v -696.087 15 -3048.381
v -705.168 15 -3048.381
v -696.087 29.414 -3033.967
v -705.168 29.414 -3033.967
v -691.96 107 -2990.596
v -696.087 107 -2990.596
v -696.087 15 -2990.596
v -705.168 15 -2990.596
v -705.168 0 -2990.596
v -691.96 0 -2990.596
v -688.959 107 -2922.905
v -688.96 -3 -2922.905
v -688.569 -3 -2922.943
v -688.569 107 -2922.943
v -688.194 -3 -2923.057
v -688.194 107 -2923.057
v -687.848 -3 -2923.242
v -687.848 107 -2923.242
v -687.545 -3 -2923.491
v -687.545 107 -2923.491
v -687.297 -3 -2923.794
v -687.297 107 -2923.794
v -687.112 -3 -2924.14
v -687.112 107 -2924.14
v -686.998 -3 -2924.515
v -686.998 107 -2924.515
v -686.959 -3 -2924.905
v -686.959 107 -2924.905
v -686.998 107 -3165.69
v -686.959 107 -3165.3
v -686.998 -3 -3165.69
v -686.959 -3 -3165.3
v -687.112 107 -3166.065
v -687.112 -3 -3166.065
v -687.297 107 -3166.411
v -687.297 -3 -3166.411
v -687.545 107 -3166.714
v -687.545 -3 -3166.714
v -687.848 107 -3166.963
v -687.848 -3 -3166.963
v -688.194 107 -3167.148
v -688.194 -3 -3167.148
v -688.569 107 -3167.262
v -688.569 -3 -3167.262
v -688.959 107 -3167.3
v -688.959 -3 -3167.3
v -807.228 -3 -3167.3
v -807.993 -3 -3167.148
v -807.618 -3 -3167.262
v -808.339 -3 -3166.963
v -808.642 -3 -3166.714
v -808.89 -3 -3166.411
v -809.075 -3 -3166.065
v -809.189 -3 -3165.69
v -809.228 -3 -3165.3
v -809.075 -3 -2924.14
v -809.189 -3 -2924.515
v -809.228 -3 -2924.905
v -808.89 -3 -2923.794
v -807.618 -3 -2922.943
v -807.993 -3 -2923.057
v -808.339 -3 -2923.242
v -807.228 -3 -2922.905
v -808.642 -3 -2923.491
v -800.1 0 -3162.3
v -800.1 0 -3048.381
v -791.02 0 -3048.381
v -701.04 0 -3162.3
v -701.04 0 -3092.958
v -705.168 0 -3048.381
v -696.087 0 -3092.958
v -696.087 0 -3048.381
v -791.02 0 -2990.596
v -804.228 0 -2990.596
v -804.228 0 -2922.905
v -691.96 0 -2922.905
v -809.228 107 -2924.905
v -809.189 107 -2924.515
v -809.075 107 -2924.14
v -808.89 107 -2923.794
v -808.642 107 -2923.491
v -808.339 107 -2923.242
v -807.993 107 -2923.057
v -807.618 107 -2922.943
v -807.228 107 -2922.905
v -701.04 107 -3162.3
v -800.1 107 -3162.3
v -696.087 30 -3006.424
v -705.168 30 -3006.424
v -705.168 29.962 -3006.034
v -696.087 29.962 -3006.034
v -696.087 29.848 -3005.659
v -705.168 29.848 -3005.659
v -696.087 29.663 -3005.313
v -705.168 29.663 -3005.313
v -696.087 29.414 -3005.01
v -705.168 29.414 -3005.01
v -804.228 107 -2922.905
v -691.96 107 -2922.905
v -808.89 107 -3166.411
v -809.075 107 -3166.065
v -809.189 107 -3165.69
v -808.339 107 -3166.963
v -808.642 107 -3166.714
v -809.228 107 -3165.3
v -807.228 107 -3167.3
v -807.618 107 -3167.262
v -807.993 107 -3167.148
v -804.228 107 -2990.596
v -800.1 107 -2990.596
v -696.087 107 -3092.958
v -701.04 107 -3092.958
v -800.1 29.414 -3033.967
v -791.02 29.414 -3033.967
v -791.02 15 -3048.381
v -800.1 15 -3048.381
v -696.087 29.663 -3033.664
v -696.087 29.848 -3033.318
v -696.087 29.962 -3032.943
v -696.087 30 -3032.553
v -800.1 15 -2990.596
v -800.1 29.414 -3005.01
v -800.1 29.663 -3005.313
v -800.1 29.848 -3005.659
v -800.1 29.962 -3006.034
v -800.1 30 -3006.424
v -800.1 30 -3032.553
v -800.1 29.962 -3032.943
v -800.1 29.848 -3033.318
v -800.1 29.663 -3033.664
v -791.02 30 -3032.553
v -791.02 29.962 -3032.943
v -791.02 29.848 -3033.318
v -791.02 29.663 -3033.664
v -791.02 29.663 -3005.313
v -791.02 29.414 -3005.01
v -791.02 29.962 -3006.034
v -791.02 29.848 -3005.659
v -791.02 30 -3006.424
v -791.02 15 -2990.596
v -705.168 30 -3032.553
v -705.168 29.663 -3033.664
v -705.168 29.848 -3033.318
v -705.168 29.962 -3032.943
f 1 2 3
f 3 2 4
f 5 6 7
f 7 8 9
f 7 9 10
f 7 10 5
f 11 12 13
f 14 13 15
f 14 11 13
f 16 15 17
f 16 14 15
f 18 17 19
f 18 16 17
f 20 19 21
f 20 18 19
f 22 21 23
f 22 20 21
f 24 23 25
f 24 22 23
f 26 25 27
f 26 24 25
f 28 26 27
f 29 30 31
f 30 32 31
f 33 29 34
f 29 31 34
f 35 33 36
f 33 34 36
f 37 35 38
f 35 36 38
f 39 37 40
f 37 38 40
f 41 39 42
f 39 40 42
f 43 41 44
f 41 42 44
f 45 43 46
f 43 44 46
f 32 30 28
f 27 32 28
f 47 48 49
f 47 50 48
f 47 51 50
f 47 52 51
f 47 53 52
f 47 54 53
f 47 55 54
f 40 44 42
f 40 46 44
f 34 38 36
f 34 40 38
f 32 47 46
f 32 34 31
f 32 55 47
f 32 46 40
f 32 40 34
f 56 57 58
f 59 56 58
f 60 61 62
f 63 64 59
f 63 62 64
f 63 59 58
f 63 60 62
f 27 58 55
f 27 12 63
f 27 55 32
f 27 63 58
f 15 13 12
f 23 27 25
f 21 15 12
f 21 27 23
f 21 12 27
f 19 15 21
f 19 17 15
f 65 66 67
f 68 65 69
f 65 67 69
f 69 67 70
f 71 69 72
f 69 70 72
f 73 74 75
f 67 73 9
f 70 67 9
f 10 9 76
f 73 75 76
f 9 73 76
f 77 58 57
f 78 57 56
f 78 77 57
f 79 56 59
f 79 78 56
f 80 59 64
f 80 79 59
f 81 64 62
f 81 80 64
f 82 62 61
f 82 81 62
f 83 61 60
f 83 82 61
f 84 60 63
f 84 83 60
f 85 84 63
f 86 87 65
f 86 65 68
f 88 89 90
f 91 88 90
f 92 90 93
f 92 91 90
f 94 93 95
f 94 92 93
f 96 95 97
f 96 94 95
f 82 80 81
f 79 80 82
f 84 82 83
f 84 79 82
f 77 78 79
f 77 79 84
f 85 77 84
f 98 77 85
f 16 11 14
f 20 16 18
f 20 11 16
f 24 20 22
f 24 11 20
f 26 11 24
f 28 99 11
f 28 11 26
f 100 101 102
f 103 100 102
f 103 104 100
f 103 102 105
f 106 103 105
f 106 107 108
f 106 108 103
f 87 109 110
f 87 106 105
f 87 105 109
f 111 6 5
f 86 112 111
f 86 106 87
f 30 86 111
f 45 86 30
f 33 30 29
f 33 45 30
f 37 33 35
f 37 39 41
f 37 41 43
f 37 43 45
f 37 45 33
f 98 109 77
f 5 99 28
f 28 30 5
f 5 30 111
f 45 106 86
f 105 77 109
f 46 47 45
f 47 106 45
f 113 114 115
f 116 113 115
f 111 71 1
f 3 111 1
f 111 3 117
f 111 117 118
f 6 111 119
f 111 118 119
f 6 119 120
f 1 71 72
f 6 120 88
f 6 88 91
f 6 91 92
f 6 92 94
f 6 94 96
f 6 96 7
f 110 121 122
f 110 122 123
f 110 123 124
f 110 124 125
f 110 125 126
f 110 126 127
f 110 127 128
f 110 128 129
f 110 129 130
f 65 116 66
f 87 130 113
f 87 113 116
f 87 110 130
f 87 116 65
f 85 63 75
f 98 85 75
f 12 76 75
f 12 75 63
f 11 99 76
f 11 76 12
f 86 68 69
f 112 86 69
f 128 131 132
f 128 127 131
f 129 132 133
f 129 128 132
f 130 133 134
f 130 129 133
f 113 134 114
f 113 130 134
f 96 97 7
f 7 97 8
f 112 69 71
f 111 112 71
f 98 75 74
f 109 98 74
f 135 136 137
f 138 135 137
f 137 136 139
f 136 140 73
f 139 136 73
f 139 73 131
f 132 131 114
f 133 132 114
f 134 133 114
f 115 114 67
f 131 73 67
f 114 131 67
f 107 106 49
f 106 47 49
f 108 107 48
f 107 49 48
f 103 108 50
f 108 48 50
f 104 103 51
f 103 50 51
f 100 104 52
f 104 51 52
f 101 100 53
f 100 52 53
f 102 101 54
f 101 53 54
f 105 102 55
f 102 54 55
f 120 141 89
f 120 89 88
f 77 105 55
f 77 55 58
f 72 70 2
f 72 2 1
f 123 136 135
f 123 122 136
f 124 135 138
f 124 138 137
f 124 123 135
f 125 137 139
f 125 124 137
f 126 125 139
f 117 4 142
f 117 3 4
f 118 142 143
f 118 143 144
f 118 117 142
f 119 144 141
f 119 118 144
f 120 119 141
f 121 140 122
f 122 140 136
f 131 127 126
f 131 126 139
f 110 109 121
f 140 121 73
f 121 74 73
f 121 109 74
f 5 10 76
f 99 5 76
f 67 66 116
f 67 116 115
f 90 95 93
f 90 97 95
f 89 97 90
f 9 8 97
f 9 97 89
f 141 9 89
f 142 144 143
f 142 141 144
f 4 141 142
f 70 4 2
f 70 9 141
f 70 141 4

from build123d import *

# Parameters (mm, degrees)
BOSS_EXTRUDE1_DEPTH = 107
SKETCH7_W           = 122.268
SKETCH7_H           = 249.395
BOSS_EXTRUDE2_DEPTH = 3
SKETCH8_W           = 9.0805
SKETCH8_H           = 57.785
BOSS_EXTRUDE3_DEPTH = 30
CUT_EXTRUDE1_DEPTH  = 9.0805
CUT_EXTRUDE2_DEPTH  = 9.0805
FILLET1_R           = 2
CUT_EXTRUDE3_DEPTH  = 3271.793089872


with BuildPart() as part:
    # Sketch6 → Boss-Extrude1 (new body)
    with BuildSketch(Plane(origin=(0, 0, 0), x_dir=(1, 0, 0), z_dir=(0, 1, 0))):
        Polygon((-809.2275, 2922.905), (-804.2275, 2922.905), (-804.2275, 2990.596), (-800.1, 2990.596), (-800.1, 3162.3), (-701.04, 3162.3), (-701.04, 3092.958), (-696.087, 3092.958), (-696.087, 2990.596), (-691.9595, 2990.596), (-691.9595, 2922.905), (-686.9595, 2922.905), (-686.9595, 3167.3), (-809.2275, 3167.3), align=None)
    extrude(amount=BOSS_EXTRUDE1_DEPTH)

    # Sketch7 → Boss-Extrude2 (add)
    with BuildSketch(Plane.XZ):
        with Locations((-748.0935, -3042.6025)):
            Rectangle(SKETCH7_W, SKETCH7_H)
    extrude(amount=BOSS_EXTRUDE2_DEPTH)

    # Sketch8 → Boss-Extrude3 (add)
    with BuildSketch(Plane(origin=(0, 0, 0), x_dir=(1, 0, 0), z_dir=(0, 1, 0))):
        with Locations((-795.55975, 3019.4885)):
            Rectangle(SKETCH8_W, SKETCH8_H)
        with Locations((-700.62725, 3019.4885)):
            Rectangle(SKETCH8_W, SKETCH8_H)
    extrude(amount=BOSS_EXTRUDE3_DEPTH)

    # Sketch9 → Cut-Extrude1 (cut)
    with BuildSketch(Plane(origin=(-791.0195, 0, 0), x_dir=(0, 0, -1), z_dir=(1, 0, 0))):
        Polygon((2990.596, 30), (2990.596, 15), (3005.596, 30), align=None)
        Polygon((3048.381, 30), (3033.381, 30), (3048.381, 15), align=None)
    extrude(amount=-CUT_EXTRUDE1_DEPTH, mode=Mode.SUBTRACT)

    # Sketch10 → Cut-Extrude2 (cut)
    with BuildSketch(Plane.ZY.offset(705.1675)):
        Polygon((-3048.381, 30), (-3048.381, 15), (-3033.381, 30), align=None)
        Polygon((-2990.596, 30), (-3005.596, 30), (-2990.596, 15), align=None)
    extrude(amount=-CUT_EXTRUDE2_DEPTH, mode=Mode.SUBTRACT)

    # Fillet1
    fillet1_edges = [part.edges().sort_by_distance(p)[0] for p in [
        (-795.55975, 30, -3005.596),
        (-795.55975, 30, -3033.381),
        (-700.62725, 30, -3033.381),
        (-700.62725, 30, -3005.596),
        (-809.2275, 53.5, -2922.905),
        (-809.2275, 52, -3167.3),
        (-686.9595, 52, -3167.3),
        (-686.9595, 53.5, -2922.905),
    ]]
    fillet(fillet1_edges, radius=FILLET1_R)

    # Sketch11 → Cut-Extrude3 (cut, through all)
    with BuildSketch(Plane(origin=(0, 0, 0), x_dir=(-1, 0, 0), z_dir=(0, 1, 0))):
        with BuildLine():
            Line((804.2275, -2922.905), (691.9595, -2922.905))
            Line((691.9595, -2922.905), (688.9595, -2922.905))
            ThreePointArc((688.9595, -2922.905), (687.545286438, -2923.490786438), (686.9595, -2924.905))
            Line((686.9595, -2924.905), (686.9595, -2917.905))
            Line((686.9595, -2917.905), (809.2275, -2917.905))
            Line((809.2275, -2917.905), (809.2275, -2924.905))
            ThreePointArc((809.2275, -2924.905), (808.641713562, -2923.490786438), (807.2275, -2922.905))
            Line((807.2275, -2922.905), (804.2275, -2922.905))
        make_face()
    extrude(amount=-CUT_EXTRUDE3_DEPTH, mode=Mode.SUBTRACT)


solid = part.part
